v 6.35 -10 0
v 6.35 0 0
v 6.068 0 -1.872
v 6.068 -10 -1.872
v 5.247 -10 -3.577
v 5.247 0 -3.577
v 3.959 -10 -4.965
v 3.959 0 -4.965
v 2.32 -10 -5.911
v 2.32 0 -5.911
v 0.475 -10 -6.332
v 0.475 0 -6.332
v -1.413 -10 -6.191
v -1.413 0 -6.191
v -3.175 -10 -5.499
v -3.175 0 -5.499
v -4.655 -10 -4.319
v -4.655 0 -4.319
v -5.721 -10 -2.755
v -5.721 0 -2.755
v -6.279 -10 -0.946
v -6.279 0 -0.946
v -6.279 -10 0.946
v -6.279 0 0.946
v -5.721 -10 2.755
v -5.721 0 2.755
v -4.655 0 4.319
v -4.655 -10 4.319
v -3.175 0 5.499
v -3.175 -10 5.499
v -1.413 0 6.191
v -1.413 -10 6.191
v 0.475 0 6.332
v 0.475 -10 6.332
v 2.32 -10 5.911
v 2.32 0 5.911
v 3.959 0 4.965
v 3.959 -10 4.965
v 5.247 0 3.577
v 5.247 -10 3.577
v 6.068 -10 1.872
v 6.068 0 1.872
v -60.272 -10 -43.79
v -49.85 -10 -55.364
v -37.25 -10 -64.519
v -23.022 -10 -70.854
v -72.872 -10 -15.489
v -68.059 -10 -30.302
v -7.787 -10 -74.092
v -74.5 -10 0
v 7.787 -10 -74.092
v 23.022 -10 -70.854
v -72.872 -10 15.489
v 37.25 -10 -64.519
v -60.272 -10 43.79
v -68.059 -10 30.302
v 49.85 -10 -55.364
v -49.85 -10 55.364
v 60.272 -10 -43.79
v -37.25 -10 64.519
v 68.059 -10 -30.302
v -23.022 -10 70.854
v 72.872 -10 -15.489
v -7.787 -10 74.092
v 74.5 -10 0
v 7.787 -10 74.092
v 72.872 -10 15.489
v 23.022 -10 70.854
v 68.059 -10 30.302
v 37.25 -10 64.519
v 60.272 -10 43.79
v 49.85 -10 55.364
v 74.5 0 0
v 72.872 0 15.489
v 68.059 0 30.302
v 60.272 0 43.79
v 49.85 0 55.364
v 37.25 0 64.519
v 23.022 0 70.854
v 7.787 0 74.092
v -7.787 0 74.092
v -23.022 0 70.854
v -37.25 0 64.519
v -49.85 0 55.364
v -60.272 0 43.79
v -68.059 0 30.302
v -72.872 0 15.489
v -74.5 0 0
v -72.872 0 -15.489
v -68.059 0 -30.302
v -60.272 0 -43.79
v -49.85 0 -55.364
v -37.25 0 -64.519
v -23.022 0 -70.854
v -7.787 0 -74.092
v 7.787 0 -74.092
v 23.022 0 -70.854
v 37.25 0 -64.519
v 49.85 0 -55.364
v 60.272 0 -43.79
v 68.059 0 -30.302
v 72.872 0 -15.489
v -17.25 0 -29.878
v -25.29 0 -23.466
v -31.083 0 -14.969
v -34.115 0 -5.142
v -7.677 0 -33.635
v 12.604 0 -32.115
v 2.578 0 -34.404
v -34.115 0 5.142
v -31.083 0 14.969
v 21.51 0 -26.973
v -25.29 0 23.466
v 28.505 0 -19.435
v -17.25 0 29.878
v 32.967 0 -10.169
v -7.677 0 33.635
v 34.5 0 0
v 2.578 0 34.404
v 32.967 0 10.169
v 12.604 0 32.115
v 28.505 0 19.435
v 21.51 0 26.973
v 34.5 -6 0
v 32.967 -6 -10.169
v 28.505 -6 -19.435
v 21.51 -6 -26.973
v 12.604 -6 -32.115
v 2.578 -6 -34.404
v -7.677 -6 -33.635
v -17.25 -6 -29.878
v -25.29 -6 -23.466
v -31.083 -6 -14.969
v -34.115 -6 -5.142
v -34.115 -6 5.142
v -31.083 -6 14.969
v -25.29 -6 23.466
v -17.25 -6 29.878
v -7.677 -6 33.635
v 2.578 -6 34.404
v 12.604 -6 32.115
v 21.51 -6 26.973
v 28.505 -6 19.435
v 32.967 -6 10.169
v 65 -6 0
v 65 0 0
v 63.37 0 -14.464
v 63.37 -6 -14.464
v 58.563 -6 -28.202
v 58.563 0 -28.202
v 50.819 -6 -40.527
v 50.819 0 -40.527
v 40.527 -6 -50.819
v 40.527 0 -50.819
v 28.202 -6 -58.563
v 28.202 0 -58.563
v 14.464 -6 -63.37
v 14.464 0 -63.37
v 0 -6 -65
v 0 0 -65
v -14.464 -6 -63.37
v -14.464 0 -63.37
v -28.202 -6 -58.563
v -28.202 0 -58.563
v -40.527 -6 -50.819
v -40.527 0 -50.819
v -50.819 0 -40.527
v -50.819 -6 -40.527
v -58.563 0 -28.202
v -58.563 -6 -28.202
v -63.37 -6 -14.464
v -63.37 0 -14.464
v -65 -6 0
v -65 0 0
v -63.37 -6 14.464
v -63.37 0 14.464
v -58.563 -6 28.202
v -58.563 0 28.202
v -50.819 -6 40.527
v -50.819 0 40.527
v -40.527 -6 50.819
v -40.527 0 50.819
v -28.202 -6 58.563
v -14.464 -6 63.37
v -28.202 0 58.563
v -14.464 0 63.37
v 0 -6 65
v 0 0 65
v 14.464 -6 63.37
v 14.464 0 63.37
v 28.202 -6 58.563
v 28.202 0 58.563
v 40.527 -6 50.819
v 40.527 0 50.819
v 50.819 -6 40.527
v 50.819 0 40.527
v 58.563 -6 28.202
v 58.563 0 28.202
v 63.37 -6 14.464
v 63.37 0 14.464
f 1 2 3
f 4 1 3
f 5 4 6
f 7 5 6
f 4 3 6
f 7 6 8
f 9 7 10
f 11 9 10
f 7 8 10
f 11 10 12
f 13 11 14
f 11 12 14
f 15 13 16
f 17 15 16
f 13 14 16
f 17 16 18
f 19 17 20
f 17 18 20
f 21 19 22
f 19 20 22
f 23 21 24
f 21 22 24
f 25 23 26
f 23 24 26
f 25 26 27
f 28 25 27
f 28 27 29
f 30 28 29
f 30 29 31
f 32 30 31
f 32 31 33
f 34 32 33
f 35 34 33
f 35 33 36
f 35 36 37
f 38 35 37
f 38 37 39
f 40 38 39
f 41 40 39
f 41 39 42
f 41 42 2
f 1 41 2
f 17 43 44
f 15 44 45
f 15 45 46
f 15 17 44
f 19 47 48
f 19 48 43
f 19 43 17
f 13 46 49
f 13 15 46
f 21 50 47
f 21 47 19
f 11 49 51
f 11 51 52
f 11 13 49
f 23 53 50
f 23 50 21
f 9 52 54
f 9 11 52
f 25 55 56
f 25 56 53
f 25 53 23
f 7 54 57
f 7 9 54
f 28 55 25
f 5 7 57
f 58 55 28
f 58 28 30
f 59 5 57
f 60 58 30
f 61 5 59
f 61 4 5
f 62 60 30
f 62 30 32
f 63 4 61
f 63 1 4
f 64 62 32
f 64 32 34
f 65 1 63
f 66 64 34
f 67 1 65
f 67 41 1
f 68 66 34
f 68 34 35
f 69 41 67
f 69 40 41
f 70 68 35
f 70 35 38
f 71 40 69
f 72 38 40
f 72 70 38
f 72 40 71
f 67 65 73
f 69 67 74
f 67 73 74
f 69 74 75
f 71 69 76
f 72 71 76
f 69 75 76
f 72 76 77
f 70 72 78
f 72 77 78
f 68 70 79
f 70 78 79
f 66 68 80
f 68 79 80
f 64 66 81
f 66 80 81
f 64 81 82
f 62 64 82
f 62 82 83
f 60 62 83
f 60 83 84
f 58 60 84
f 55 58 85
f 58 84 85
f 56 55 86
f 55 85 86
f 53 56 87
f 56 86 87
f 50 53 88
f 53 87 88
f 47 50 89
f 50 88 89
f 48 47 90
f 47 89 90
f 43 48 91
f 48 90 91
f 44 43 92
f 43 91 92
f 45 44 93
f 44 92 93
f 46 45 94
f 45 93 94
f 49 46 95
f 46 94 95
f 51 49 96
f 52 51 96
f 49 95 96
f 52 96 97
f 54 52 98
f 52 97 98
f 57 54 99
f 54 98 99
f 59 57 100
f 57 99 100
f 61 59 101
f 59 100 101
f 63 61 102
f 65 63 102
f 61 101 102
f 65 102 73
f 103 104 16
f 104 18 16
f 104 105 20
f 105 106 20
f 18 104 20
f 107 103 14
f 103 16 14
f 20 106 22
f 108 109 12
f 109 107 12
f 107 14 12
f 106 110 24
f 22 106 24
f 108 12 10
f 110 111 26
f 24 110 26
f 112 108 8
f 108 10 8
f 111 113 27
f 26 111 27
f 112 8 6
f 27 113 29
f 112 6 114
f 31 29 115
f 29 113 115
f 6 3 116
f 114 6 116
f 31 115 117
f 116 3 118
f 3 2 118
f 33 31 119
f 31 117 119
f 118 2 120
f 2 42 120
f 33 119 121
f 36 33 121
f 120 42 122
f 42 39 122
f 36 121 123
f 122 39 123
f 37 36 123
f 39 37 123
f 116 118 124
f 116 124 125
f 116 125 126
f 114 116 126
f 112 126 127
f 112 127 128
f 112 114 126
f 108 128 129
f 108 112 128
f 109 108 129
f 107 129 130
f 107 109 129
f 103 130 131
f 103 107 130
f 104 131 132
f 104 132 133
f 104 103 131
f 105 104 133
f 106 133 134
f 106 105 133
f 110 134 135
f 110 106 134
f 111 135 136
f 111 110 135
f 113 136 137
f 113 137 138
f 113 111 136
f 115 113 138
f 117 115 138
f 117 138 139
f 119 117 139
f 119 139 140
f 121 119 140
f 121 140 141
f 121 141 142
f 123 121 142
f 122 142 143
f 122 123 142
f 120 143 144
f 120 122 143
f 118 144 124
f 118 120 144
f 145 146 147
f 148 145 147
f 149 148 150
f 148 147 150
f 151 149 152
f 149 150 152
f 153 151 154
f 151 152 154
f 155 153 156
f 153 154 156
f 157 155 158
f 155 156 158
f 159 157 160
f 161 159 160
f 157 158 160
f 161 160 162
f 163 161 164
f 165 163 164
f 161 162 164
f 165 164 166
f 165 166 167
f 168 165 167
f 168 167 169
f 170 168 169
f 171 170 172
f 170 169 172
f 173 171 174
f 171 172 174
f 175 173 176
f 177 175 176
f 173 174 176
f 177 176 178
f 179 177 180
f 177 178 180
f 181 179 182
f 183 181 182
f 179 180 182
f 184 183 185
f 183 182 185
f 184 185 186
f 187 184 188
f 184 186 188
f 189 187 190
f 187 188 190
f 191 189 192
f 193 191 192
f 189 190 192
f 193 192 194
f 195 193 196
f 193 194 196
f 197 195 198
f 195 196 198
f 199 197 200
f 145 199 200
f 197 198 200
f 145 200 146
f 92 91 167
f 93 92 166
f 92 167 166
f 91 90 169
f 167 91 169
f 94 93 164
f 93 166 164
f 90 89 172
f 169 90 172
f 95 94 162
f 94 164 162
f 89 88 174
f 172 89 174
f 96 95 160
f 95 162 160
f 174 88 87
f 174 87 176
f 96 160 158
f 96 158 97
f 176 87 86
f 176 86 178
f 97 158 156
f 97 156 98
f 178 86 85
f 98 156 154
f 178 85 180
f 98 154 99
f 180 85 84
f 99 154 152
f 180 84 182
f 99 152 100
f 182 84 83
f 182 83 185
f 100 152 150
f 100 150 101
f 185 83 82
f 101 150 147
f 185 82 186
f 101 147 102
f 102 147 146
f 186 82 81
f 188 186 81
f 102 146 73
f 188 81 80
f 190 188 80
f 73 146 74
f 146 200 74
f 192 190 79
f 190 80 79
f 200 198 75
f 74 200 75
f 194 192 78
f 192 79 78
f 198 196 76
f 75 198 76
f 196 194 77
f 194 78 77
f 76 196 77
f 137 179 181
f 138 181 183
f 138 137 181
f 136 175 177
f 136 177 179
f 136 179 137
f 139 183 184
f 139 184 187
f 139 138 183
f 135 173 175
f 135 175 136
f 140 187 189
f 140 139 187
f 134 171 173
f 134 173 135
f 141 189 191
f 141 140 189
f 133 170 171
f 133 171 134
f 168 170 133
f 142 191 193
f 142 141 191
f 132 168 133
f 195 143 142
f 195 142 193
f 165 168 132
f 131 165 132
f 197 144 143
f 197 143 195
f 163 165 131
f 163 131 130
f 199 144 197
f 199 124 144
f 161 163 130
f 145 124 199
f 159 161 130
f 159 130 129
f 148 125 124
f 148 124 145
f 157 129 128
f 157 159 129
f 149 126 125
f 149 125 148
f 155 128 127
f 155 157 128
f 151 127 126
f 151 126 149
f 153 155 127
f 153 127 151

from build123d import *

# Parameters (mm, degrees)
SKETCH_R        = 74.5
PAD_DEPTH       = 10
SKETCH001_R     = 6.35
POCKET_DEPTH    = 10.001
SKETCH002_R     = 65
SKETCH002_R_2   = 34.5
POCKET001_DEPTH = 6


with BuildPart() as part:
    # Sketch → Pad (new body)
    with BuildSketch(Plane.XZ):
        Circle(SKETCH_R)
    extrude(amount=PAD_DEPTH)

    # Sketch001 (on Face2 of Pad) → Pocket (cut, through all)
    with BuildSketch(Plane(origin=(0, 0, 0), x_dir=(1, 0, 0), z_dir=(0, 1, 0))):
        Circle(SKETCH001_R)
    extrude(amount=-POCKET_DEPTH, mode=Mode.SUBTRACT)

    # Sketch002 (on Face2 of Pocket) → Pocket001 (cut)
    with BuildSketch(Plane(origin=(0, 0, 0), x_dir=(1, 0, 0), z_dir=(0, 1, 0))):
        Circle(SKETCH002_R)
        Circle(SKETCH002_R_2, mode=Mode.SUBTRACT)
    extrude(amount=-POCKET001_DEPTH, mode=Mode.SUBTRACT)


solid = part.part
